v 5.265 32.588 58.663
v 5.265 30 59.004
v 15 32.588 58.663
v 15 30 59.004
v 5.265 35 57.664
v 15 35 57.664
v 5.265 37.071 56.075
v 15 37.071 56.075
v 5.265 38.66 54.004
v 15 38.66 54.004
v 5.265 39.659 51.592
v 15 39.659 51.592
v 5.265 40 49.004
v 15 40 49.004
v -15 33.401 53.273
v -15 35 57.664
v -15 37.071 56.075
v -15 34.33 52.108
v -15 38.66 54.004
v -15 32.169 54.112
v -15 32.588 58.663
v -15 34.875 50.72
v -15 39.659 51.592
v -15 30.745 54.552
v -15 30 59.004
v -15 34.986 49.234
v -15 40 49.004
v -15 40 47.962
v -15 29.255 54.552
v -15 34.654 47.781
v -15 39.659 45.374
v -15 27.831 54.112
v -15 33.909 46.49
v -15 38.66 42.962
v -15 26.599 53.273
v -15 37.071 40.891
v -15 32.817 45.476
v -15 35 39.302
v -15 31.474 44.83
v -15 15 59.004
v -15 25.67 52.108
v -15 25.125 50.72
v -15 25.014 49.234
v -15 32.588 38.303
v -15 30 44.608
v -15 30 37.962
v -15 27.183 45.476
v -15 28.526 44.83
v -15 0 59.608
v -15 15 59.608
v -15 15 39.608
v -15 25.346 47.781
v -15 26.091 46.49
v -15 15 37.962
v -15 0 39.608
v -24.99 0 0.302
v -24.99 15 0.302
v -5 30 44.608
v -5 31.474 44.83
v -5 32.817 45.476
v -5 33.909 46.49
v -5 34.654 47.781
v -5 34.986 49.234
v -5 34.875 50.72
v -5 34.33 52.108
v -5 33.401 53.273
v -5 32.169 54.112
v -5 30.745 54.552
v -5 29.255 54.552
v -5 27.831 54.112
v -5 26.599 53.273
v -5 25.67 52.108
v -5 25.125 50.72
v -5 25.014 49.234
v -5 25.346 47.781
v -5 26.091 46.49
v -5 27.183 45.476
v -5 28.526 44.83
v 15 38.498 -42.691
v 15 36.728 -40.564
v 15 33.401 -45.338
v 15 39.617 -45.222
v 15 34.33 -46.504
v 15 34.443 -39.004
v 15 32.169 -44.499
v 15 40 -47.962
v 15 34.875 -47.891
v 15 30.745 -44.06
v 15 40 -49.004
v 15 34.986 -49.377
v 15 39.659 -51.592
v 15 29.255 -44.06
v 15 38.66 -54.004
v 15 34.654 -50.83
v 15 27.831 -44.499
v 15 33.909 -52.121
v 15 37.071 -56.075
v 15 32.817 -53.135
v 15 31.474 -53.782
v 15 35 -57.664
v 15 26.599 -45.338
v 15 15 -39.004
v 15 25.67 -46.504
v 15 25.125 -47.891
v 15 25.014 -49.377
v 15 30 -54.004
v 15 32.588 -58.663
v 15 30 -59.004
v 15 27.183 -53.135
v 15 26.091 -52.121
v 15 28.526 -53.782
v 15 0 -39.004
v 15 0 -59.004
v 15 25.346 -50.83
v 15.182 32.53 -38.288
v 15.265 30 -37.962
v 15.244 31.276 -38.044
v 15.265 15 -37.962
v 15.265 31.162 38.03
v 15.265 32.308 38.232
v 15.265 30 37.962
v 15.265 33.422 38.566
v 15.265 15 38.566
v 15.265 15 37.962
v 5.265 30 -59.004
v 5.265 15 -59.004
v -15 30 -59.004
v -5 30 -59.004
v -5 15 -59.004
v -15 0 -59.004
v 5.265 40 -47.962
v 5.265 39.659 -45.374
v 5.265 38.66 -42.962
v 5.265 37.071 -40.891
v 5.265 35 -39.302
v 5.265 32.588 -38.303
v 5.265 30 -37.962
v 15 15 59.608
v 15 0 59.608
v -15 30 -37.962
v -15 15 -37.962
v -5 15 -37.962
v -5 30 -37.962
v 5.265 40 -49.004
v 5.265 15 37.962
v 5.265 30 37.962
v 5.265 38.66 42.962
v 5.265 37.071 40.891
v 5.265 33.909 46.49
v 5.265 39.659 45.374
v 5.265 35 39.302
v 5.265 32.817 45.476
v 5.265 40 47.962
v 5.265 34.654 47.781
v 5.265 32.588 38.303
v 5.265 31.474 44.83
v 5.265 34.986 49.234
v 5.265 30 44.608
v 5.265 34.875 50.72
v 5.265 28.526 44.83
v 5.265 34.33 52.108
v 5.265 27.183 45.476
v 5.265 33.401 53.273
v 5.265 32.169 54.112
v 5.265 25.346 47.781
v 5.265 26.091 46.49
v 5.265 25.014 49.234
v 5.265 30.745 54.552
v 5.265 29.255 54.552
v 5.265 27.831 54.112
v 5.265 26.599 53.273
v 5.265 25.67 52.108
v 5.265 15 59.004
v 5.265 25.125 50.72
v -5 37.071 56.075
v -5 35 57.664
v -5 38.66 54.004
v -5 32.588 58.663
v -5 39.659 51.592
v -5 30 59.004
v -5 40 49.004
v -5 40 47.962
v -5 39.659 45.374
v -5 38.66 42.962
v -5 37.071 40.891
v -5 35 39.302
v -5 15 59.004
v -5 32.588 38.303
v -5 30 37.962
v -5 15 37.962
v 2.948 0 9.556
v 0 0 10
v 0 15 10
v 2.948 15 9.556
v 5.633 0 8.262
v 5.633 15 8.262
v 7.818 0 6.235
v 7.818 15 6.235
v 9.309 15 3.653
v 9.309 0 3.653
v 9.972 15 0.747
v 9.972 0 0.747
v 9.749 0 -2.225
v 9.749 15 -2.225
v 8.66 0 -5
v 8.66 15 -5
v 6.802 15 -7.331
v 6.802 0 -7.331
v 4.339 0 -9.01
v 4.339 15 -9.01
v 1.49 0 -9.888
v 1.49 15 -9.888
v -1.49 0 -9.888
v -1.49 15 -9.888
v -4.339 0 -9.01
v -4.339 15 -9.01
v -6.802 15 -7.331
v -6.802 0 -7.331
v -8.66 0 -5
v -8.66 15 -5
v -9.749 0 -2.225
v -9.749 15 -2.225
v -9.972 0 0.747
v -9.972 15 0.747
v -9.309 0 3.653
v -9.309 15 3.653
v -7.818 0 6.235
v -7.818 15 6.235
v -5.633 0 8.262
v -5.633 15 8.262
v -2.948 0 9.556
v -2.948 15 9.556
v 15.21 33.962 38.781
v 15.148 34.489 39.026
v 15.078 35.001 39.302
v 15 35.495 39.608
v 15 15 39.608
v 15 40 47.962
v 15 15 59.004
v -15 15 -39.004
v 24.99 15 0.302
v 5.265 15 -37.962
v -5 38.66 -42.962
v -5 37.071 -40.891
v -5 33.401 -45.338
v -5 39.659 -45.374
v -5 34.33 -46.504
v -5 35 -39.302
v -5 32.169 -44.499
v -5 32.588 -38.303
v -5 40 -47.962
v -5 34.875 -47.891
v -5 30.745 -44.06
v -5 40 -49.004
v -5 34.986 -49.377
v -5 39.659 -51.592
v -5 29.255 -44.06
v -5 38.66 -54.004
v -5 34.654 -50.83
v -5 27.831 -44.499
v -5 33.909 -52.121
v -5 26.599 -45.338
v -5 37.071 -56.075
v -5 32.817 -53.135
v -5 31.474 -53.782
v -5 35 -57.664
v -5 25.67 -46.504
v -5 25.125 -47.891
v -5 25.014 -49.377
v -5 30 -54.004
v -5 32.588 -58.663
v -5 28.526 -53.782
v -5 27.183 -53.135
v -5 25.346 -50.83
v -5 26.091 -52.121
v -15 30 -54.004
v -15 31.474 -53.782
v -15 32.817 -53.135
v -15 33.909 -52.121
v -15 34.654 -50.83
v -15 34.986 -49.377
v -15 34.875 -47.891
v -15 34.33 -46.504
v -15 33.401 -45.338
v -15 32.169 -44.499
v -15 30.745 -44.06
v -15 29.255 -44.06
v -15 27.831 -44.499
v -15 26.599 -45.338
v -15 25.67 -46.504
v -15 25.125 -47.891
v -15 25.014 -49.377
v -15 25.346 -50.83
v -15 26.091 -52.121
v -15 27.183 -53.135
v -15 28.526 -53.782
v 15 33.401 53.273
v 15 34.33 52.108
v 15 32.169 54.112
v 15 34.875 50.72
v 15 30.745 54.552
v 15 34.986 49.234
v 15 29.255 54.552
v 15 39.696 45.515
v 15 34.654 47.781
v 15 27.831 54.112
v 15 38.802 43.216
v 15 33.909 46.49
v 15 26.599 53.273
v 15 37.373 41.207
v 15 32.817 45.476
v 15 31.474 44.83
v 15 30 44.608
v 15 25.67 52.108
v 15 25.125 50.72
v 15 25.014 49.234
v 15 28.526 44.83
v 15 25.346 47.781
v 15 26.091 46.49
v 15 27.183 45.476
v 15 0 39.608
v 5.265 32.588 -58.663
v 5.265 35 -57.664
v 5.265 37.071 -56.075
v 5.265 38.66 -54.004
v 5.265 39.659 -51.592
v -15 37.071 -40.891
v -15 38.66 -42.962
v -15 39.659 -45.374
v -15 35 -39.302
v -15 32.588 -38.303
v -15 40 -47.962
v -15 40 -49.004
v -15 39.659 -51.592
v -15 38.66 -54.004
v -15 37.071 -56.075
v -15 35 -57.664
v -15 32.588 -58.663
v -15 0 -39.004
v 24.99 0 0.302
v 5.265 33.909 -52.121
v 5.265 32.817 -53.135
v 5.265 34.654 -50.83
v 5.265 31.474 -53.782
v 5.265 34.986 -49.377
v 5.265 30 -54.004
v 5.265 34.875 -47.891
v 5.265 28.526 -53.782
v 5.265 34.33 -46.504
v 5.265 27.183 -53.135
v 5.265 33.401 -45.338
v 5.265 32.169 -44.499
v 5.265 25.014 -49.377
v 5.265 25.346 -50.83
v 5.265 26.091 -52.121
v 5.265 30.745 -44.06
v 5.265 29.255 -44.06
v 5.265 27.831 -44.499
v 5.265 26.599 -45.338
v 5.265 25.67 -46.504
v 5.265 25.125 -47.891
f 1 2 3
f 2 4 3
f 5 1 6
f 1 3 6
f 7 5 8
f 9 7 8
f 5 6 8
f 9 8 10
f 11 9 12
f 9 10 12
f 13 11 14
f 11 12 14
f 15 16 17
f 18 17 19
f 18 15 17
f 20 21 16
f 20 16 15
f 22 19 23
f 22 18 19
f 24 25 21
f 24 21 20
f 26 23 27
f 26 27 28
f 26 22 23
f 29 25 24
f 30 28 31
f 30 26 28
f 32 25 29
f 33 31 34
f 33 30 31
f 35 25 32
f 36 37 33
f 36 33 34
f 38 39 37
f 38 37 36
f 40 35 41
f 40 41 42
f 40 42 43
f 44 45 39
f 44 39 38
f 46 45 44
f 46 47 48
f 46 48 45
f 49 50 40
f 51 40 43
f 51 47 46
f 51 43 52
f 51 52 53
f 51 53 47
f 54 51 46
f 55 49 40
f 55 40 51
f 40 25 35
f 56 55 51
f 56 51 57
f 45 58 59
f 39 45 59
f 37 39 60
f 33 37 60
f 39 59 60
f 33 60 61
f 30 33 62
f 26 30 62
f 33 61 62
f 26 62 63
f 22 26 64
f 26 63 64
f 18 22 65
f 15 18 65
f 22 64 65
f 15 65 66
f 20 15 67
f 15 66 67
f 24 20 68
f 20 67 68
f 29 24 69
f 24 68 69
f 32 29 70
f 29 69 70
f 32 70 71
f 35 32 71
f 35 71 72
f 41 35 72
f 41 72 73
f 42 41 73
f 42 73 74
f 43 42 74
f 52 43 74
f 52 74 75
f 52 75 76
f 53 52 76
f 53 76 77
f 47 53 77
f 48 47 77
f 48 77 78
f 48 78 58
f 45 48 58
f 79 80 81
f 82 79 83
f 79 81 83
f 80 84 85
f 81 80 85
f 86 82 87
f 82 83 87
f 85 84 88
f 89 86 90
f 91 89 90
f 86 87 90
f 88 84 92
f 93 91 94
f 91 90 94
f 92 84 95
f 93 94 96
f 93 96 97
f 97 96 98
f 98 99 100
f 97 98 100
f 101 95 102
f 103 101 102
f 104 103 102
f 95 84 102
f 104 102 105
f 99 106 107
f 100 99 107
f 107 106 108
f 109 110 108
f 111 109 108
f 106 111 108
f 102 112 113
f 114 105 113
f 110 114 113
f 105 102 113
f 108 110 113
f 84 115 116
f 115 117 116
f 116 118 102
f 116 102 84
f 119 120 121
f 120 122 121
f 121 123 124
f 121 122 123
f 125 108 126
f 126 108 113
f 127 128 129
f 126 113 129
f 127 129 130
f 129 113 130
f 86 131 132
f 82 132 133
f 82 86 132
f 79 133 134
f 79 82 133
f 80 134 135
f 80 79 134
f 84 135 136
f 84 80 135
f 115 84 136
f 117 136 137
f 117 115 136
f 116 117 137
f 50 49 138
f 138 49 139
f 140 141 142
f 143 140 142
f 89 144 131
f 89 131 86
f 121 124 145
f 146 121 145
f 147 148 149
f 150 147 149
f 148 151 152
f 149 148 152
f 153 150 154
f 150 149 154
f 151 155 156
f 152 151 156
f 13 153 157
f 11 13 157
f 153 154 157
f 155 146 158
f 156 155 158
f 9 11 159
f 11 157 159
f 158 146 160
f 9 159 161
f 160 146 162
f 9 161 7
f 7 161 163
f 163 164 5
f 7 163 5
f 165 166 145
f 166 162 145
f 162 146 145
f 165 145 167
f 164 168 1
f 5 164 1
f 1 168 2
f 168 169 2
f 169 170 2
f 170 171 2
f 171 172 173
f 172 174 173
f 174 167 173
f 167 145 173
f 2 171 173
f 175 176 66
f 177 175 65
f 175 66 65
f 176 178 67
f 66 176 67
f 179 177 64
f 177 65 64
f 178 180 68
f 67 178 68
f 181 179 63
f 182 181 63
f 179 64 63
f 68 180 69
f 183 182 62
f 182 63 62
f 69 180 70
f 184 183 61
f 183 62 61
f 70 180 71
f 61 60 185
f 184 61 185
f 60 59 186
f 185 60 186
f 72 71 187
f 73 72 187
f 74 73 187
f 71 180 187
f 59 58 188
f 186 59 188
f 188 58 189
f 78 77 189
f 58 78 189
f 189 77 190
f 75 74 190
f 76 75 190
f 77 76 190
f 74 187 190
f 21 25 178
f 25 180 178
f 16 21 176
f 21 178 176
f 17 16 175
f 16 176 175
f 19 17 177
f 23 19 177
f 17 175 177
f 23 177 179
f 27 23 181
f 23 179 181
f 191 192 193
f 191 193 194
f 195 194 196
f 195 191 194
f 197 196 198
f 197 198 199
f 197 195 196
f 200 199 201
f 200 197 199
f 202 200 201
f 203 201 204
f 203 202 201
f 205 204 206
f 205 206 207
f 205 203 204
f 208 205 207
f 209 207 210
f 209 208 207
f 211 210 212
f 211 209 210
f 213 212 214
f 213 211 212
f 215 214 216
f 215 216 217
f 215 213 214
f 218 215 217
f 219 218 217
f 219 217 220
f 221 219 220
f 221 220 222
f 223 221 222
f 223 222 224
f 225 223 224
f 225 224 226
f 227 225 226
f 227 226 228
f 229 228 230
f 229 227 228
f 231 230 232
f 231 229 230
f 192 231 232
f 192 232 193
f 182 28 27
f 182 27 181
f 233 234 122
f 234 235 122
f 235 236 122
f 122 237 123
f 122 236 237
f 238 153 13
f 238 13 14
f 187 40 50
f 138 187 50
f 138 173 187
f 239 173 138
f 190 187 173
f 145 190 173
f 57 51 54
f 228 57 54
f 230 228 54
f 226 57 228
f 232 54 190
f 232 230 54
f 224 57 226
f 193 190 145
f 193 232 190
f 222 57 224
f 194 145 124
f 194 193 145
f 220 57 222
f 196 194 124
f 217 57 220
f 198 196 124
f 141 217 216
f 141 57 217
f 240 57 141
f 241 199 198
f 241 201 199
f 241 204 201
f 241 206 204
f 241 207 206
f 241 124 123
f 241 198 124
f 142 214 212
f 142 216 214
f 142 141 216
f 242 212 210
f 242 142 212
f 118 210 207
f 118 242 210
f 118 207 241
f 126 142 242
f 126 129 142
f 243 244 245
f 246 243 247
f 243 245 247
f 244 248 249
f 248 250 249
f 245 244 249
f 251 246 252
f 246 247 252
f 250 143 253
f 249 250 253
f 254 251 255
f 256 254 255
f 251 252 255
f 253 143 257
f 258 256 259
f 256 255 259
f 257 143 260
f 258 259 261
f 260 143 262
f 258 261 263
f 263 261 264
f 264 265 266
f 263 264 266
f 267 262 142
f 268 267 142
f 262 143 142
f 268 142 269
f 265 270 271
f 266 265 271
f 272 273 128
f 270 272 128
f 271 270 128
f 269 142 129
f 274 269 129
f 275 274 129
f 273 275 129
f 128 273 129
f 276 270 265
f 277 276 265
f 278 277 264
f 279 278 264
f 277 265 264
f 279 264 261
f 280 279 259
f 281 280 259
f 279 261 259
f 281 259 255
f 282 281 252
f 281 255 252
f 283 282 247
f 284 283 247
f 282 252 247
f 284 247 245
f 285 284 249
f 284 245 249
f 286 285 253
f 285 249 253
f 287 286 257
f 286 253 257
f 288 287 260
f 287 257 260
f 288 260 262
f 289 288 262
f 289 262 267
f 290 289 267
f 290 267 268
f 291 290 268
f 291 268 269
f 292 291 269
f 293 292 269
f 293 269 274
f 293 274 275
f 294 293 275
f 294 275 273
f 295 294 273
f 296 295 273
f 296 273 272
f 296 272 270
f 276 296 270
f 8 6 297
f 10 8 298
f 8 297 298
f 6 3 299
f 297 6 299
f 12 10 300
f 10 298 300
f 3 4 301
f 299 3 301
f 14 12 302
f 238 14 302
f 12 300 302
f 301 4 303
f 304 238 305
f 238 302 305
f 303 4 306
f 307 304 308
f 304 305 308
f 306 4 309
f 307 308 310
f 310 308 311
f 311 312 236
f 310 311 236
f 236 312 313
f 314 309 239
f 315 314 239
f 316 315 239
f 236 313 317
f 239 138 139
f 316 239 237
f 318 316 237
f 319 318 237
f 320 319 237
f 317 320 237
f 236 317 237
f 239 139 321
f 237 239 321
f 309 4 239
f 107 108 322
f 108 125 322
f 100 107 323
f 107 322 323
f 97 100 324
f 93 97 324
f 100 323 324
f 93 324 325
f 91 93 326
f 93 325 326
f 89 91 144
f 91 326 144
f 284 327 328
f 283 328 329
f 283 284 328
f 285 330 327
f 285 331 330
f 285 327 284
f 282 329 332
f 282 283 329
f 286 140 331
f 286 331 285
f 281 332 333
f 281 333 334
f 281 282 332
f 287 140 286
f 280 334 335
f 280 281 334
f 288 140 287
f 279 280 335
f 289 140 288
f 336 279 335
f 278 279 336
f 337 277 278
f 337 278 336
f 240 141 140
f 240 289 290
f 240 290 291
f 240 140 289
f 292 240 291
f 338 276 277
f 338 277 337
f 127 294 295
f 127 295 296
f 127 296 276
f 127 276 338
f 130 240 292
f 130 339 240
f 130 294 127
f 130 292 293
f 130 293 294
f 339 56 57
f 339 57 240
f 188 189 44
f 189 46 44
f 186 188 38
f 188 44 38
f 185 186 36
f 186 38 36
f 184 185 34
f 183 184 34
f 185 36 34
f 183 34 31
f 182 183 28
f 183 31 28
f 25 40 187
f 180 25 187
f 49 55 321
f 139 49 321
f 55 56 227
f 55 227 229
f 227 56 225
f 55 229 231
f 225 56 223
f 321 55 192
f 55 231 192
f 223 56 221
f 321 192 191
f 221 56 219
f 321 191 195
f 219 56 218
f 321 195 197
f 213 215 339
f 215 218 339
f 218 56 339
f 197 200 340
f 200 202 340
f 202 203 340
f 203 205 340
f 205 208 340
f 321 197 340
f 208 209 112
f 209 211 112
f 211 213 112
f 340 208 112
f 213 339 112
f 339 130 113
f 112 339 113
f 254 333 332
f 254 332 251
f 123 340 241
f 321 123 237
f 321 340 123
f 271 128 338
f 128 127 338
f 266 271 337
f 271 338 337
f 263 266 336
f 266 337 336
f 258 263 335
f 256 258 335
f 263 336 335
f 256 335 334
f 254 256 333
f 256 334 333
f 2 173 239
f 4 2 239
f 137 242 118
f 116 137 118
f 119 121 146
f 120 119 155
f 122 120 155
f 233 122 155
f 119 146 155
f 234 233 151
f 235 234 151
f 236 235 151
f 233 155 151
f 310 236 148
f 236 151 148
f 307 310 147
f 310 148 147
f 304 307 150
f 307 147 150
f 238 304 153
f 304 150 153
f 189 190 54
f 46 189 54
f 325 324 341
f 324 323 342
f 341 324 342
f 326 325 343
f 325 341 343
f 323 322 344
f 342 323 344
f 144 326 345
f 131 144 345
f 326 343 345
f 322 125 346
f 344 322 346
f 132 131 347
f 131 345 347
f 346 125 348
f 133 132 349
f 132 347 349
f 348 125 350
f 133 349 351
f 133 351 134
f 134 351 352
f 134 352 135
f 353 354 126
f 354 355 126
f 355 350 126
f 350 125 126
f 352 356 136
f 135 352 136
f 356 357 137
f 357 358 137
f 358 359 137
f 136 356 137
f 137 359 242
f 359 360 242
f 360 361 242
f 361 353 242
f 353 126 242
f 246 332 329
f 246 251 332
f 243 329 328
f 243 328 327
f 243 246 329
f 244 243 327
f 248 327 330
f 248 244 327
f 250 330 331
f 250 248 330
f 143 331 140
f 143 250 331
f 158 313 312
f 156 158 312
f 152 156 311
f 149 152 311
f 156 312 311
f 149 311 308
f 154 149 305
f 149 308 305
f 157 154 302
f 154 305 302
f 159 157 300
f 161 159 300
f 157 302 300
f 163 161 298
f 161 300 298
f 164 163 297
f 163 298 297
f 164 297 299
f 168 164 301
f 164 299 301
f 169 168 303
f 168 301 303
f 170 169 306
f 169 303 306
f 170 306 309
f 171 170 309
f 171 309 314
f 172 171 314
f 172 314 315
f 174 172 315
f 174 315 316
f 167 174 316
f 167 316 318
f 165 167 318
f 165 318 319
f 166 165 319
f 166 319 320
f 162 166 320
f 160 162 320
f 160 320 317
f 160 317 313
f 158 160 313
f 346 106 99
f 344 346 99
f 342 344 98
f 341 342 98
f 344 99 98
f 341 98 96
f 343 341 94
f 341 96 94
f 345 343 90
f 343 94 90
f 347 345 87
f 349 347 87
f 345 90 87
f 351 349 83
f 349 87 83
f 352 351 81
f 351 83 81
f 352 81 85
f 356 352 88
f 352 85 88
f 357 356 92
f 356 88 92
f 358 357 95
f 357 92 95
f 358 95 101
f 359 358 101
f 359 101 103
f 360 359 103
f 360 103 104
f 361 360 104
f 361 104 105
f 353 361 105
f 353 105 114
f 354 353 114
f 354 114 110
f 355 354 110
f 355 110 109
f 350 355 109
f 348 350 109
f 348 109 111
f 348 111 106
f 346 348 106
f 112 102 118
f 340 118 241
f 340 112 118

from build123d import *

# Parameters (mm, degrees)
SKETCH1_R           = 10
SKETCH1_W           = 30
SKETCH1_H           = 20
BOSS_EXTRUDE1_DEPTH = 15
BOSS_EXTRUDE2_DEPTH = 25
SKETCH3_R           = 5
CUT_EXTRUDE1_DEPTH  = 58
FILLET1_R           = 10


with BuildPart() as part:
    # Sketch1 → Boss-Extrude1 (new body)
    # profile 1 of 3: a face of its own
    with BuildSketch(Plane(origin=(0, 0, 0), x_dir=(1, 0, 0), z_dir=(0, 1, 0))):
        Polygon((-15, -39.607549464), (-24.990355032, -0.301923542), (-15, 39.00370238), (15, 39.00370238), (24.990355032, -0.301923542), (15, -39.607549464), align=None)
        with Locations(Location((0, 0, 0), (0, 0, 270))):
            Circle(SKETCH1_R, mode=Mode.SUBTRACT)
    # profile 2 of 3: a face of its own
    with BuildSketch(Plane(origin=(0, 0, 0), x_dir=(1, 0, 0), z_dir=(0, 1, 0))):
        with Locations((0, -49.607549464)):
            Rectangle(SKETCH1_W, SKETCH1_H)
    # profile 3 of 3: a face of its own
    with BuildSketch(Plane(origin=(0, 0, 0), x_dir=(1, 0, 0), z_dir=(0, 1, 0))):
        with Locations((0, 49.00370238)):
            Rectangle(SKETCH1_W, SKETCH1_H)
    extrude(amount=BOSS_EXTRUDE1_DEPTH)

    # Sketch2 → Boss-Extrude2 (add)
    with BuildSketch(Plane(origin=(0, 15, 0), x_dir=(1, 0, 0), z_dir=(0, 1, 0))):
        Polygon((15, 59.00370238), (5.264710161, 59.00370238), (5.264710161, 37.962238036), (15.264710161, 37.962238036), (15, 39.00370238), align=None)
        Polygon((-5, 59.00370238), (-15, 59.00370238), (-15, 39.00370238), (-15, 37.962238036), (-5, 37.962238036), align=None)
        Polygon((-5, -59.00370238), (-5, -37.962238036), (-15, -37.962238036), (-15, -39.607549464), (-15, -59.00370238), align=None)
        Polygon((15, -39.607549464), (15.264710161, -38.56608512), (15.264710161, -37.962238036), (5.264710161, -37.962238036), (5.264710161, -59.00370238), (15, -59.00370238), align=None)
    extrude(amount=BOSS_EXTRUDE2_DEPTH)

    # Sketch3 → Cut-Extrude1 (cut)
    with BuildSketch(Plane(origin=(15, 0, 0), x_dir=(0, 0, -1), z_dir=(1, 0, 0))):
        with Locations((-49.607549464, 30)):
            Circle(SKETCH3_R)
        with Locations((49.00370238, 30)):
            Circle(SKETCH3_R)
    extrude(amount=-CUT_EXTRUDE1_DEPTH, mode=Mode.SUBTRACT)

    # Fillet1
    fillet1_edges = [part.edges().sort_by_distance(p)[0] for p in [
        (10.13235508, 40, -59.00370238),
        (10.264710161, 40, -37.962238036),
        (-10, 40, -59.00370238),
        (-10, 40, -37.962238036),
        (10.264710161, 40, 37.962238036),
        (-10, 40, 37.962238036),
        (10.13235508, 40, 59.00370238),
        (-10, 40, 59.00370238),
    ]]
    fillet(fillet1_edges, radius=FILLET1_R)


solid = part.part
